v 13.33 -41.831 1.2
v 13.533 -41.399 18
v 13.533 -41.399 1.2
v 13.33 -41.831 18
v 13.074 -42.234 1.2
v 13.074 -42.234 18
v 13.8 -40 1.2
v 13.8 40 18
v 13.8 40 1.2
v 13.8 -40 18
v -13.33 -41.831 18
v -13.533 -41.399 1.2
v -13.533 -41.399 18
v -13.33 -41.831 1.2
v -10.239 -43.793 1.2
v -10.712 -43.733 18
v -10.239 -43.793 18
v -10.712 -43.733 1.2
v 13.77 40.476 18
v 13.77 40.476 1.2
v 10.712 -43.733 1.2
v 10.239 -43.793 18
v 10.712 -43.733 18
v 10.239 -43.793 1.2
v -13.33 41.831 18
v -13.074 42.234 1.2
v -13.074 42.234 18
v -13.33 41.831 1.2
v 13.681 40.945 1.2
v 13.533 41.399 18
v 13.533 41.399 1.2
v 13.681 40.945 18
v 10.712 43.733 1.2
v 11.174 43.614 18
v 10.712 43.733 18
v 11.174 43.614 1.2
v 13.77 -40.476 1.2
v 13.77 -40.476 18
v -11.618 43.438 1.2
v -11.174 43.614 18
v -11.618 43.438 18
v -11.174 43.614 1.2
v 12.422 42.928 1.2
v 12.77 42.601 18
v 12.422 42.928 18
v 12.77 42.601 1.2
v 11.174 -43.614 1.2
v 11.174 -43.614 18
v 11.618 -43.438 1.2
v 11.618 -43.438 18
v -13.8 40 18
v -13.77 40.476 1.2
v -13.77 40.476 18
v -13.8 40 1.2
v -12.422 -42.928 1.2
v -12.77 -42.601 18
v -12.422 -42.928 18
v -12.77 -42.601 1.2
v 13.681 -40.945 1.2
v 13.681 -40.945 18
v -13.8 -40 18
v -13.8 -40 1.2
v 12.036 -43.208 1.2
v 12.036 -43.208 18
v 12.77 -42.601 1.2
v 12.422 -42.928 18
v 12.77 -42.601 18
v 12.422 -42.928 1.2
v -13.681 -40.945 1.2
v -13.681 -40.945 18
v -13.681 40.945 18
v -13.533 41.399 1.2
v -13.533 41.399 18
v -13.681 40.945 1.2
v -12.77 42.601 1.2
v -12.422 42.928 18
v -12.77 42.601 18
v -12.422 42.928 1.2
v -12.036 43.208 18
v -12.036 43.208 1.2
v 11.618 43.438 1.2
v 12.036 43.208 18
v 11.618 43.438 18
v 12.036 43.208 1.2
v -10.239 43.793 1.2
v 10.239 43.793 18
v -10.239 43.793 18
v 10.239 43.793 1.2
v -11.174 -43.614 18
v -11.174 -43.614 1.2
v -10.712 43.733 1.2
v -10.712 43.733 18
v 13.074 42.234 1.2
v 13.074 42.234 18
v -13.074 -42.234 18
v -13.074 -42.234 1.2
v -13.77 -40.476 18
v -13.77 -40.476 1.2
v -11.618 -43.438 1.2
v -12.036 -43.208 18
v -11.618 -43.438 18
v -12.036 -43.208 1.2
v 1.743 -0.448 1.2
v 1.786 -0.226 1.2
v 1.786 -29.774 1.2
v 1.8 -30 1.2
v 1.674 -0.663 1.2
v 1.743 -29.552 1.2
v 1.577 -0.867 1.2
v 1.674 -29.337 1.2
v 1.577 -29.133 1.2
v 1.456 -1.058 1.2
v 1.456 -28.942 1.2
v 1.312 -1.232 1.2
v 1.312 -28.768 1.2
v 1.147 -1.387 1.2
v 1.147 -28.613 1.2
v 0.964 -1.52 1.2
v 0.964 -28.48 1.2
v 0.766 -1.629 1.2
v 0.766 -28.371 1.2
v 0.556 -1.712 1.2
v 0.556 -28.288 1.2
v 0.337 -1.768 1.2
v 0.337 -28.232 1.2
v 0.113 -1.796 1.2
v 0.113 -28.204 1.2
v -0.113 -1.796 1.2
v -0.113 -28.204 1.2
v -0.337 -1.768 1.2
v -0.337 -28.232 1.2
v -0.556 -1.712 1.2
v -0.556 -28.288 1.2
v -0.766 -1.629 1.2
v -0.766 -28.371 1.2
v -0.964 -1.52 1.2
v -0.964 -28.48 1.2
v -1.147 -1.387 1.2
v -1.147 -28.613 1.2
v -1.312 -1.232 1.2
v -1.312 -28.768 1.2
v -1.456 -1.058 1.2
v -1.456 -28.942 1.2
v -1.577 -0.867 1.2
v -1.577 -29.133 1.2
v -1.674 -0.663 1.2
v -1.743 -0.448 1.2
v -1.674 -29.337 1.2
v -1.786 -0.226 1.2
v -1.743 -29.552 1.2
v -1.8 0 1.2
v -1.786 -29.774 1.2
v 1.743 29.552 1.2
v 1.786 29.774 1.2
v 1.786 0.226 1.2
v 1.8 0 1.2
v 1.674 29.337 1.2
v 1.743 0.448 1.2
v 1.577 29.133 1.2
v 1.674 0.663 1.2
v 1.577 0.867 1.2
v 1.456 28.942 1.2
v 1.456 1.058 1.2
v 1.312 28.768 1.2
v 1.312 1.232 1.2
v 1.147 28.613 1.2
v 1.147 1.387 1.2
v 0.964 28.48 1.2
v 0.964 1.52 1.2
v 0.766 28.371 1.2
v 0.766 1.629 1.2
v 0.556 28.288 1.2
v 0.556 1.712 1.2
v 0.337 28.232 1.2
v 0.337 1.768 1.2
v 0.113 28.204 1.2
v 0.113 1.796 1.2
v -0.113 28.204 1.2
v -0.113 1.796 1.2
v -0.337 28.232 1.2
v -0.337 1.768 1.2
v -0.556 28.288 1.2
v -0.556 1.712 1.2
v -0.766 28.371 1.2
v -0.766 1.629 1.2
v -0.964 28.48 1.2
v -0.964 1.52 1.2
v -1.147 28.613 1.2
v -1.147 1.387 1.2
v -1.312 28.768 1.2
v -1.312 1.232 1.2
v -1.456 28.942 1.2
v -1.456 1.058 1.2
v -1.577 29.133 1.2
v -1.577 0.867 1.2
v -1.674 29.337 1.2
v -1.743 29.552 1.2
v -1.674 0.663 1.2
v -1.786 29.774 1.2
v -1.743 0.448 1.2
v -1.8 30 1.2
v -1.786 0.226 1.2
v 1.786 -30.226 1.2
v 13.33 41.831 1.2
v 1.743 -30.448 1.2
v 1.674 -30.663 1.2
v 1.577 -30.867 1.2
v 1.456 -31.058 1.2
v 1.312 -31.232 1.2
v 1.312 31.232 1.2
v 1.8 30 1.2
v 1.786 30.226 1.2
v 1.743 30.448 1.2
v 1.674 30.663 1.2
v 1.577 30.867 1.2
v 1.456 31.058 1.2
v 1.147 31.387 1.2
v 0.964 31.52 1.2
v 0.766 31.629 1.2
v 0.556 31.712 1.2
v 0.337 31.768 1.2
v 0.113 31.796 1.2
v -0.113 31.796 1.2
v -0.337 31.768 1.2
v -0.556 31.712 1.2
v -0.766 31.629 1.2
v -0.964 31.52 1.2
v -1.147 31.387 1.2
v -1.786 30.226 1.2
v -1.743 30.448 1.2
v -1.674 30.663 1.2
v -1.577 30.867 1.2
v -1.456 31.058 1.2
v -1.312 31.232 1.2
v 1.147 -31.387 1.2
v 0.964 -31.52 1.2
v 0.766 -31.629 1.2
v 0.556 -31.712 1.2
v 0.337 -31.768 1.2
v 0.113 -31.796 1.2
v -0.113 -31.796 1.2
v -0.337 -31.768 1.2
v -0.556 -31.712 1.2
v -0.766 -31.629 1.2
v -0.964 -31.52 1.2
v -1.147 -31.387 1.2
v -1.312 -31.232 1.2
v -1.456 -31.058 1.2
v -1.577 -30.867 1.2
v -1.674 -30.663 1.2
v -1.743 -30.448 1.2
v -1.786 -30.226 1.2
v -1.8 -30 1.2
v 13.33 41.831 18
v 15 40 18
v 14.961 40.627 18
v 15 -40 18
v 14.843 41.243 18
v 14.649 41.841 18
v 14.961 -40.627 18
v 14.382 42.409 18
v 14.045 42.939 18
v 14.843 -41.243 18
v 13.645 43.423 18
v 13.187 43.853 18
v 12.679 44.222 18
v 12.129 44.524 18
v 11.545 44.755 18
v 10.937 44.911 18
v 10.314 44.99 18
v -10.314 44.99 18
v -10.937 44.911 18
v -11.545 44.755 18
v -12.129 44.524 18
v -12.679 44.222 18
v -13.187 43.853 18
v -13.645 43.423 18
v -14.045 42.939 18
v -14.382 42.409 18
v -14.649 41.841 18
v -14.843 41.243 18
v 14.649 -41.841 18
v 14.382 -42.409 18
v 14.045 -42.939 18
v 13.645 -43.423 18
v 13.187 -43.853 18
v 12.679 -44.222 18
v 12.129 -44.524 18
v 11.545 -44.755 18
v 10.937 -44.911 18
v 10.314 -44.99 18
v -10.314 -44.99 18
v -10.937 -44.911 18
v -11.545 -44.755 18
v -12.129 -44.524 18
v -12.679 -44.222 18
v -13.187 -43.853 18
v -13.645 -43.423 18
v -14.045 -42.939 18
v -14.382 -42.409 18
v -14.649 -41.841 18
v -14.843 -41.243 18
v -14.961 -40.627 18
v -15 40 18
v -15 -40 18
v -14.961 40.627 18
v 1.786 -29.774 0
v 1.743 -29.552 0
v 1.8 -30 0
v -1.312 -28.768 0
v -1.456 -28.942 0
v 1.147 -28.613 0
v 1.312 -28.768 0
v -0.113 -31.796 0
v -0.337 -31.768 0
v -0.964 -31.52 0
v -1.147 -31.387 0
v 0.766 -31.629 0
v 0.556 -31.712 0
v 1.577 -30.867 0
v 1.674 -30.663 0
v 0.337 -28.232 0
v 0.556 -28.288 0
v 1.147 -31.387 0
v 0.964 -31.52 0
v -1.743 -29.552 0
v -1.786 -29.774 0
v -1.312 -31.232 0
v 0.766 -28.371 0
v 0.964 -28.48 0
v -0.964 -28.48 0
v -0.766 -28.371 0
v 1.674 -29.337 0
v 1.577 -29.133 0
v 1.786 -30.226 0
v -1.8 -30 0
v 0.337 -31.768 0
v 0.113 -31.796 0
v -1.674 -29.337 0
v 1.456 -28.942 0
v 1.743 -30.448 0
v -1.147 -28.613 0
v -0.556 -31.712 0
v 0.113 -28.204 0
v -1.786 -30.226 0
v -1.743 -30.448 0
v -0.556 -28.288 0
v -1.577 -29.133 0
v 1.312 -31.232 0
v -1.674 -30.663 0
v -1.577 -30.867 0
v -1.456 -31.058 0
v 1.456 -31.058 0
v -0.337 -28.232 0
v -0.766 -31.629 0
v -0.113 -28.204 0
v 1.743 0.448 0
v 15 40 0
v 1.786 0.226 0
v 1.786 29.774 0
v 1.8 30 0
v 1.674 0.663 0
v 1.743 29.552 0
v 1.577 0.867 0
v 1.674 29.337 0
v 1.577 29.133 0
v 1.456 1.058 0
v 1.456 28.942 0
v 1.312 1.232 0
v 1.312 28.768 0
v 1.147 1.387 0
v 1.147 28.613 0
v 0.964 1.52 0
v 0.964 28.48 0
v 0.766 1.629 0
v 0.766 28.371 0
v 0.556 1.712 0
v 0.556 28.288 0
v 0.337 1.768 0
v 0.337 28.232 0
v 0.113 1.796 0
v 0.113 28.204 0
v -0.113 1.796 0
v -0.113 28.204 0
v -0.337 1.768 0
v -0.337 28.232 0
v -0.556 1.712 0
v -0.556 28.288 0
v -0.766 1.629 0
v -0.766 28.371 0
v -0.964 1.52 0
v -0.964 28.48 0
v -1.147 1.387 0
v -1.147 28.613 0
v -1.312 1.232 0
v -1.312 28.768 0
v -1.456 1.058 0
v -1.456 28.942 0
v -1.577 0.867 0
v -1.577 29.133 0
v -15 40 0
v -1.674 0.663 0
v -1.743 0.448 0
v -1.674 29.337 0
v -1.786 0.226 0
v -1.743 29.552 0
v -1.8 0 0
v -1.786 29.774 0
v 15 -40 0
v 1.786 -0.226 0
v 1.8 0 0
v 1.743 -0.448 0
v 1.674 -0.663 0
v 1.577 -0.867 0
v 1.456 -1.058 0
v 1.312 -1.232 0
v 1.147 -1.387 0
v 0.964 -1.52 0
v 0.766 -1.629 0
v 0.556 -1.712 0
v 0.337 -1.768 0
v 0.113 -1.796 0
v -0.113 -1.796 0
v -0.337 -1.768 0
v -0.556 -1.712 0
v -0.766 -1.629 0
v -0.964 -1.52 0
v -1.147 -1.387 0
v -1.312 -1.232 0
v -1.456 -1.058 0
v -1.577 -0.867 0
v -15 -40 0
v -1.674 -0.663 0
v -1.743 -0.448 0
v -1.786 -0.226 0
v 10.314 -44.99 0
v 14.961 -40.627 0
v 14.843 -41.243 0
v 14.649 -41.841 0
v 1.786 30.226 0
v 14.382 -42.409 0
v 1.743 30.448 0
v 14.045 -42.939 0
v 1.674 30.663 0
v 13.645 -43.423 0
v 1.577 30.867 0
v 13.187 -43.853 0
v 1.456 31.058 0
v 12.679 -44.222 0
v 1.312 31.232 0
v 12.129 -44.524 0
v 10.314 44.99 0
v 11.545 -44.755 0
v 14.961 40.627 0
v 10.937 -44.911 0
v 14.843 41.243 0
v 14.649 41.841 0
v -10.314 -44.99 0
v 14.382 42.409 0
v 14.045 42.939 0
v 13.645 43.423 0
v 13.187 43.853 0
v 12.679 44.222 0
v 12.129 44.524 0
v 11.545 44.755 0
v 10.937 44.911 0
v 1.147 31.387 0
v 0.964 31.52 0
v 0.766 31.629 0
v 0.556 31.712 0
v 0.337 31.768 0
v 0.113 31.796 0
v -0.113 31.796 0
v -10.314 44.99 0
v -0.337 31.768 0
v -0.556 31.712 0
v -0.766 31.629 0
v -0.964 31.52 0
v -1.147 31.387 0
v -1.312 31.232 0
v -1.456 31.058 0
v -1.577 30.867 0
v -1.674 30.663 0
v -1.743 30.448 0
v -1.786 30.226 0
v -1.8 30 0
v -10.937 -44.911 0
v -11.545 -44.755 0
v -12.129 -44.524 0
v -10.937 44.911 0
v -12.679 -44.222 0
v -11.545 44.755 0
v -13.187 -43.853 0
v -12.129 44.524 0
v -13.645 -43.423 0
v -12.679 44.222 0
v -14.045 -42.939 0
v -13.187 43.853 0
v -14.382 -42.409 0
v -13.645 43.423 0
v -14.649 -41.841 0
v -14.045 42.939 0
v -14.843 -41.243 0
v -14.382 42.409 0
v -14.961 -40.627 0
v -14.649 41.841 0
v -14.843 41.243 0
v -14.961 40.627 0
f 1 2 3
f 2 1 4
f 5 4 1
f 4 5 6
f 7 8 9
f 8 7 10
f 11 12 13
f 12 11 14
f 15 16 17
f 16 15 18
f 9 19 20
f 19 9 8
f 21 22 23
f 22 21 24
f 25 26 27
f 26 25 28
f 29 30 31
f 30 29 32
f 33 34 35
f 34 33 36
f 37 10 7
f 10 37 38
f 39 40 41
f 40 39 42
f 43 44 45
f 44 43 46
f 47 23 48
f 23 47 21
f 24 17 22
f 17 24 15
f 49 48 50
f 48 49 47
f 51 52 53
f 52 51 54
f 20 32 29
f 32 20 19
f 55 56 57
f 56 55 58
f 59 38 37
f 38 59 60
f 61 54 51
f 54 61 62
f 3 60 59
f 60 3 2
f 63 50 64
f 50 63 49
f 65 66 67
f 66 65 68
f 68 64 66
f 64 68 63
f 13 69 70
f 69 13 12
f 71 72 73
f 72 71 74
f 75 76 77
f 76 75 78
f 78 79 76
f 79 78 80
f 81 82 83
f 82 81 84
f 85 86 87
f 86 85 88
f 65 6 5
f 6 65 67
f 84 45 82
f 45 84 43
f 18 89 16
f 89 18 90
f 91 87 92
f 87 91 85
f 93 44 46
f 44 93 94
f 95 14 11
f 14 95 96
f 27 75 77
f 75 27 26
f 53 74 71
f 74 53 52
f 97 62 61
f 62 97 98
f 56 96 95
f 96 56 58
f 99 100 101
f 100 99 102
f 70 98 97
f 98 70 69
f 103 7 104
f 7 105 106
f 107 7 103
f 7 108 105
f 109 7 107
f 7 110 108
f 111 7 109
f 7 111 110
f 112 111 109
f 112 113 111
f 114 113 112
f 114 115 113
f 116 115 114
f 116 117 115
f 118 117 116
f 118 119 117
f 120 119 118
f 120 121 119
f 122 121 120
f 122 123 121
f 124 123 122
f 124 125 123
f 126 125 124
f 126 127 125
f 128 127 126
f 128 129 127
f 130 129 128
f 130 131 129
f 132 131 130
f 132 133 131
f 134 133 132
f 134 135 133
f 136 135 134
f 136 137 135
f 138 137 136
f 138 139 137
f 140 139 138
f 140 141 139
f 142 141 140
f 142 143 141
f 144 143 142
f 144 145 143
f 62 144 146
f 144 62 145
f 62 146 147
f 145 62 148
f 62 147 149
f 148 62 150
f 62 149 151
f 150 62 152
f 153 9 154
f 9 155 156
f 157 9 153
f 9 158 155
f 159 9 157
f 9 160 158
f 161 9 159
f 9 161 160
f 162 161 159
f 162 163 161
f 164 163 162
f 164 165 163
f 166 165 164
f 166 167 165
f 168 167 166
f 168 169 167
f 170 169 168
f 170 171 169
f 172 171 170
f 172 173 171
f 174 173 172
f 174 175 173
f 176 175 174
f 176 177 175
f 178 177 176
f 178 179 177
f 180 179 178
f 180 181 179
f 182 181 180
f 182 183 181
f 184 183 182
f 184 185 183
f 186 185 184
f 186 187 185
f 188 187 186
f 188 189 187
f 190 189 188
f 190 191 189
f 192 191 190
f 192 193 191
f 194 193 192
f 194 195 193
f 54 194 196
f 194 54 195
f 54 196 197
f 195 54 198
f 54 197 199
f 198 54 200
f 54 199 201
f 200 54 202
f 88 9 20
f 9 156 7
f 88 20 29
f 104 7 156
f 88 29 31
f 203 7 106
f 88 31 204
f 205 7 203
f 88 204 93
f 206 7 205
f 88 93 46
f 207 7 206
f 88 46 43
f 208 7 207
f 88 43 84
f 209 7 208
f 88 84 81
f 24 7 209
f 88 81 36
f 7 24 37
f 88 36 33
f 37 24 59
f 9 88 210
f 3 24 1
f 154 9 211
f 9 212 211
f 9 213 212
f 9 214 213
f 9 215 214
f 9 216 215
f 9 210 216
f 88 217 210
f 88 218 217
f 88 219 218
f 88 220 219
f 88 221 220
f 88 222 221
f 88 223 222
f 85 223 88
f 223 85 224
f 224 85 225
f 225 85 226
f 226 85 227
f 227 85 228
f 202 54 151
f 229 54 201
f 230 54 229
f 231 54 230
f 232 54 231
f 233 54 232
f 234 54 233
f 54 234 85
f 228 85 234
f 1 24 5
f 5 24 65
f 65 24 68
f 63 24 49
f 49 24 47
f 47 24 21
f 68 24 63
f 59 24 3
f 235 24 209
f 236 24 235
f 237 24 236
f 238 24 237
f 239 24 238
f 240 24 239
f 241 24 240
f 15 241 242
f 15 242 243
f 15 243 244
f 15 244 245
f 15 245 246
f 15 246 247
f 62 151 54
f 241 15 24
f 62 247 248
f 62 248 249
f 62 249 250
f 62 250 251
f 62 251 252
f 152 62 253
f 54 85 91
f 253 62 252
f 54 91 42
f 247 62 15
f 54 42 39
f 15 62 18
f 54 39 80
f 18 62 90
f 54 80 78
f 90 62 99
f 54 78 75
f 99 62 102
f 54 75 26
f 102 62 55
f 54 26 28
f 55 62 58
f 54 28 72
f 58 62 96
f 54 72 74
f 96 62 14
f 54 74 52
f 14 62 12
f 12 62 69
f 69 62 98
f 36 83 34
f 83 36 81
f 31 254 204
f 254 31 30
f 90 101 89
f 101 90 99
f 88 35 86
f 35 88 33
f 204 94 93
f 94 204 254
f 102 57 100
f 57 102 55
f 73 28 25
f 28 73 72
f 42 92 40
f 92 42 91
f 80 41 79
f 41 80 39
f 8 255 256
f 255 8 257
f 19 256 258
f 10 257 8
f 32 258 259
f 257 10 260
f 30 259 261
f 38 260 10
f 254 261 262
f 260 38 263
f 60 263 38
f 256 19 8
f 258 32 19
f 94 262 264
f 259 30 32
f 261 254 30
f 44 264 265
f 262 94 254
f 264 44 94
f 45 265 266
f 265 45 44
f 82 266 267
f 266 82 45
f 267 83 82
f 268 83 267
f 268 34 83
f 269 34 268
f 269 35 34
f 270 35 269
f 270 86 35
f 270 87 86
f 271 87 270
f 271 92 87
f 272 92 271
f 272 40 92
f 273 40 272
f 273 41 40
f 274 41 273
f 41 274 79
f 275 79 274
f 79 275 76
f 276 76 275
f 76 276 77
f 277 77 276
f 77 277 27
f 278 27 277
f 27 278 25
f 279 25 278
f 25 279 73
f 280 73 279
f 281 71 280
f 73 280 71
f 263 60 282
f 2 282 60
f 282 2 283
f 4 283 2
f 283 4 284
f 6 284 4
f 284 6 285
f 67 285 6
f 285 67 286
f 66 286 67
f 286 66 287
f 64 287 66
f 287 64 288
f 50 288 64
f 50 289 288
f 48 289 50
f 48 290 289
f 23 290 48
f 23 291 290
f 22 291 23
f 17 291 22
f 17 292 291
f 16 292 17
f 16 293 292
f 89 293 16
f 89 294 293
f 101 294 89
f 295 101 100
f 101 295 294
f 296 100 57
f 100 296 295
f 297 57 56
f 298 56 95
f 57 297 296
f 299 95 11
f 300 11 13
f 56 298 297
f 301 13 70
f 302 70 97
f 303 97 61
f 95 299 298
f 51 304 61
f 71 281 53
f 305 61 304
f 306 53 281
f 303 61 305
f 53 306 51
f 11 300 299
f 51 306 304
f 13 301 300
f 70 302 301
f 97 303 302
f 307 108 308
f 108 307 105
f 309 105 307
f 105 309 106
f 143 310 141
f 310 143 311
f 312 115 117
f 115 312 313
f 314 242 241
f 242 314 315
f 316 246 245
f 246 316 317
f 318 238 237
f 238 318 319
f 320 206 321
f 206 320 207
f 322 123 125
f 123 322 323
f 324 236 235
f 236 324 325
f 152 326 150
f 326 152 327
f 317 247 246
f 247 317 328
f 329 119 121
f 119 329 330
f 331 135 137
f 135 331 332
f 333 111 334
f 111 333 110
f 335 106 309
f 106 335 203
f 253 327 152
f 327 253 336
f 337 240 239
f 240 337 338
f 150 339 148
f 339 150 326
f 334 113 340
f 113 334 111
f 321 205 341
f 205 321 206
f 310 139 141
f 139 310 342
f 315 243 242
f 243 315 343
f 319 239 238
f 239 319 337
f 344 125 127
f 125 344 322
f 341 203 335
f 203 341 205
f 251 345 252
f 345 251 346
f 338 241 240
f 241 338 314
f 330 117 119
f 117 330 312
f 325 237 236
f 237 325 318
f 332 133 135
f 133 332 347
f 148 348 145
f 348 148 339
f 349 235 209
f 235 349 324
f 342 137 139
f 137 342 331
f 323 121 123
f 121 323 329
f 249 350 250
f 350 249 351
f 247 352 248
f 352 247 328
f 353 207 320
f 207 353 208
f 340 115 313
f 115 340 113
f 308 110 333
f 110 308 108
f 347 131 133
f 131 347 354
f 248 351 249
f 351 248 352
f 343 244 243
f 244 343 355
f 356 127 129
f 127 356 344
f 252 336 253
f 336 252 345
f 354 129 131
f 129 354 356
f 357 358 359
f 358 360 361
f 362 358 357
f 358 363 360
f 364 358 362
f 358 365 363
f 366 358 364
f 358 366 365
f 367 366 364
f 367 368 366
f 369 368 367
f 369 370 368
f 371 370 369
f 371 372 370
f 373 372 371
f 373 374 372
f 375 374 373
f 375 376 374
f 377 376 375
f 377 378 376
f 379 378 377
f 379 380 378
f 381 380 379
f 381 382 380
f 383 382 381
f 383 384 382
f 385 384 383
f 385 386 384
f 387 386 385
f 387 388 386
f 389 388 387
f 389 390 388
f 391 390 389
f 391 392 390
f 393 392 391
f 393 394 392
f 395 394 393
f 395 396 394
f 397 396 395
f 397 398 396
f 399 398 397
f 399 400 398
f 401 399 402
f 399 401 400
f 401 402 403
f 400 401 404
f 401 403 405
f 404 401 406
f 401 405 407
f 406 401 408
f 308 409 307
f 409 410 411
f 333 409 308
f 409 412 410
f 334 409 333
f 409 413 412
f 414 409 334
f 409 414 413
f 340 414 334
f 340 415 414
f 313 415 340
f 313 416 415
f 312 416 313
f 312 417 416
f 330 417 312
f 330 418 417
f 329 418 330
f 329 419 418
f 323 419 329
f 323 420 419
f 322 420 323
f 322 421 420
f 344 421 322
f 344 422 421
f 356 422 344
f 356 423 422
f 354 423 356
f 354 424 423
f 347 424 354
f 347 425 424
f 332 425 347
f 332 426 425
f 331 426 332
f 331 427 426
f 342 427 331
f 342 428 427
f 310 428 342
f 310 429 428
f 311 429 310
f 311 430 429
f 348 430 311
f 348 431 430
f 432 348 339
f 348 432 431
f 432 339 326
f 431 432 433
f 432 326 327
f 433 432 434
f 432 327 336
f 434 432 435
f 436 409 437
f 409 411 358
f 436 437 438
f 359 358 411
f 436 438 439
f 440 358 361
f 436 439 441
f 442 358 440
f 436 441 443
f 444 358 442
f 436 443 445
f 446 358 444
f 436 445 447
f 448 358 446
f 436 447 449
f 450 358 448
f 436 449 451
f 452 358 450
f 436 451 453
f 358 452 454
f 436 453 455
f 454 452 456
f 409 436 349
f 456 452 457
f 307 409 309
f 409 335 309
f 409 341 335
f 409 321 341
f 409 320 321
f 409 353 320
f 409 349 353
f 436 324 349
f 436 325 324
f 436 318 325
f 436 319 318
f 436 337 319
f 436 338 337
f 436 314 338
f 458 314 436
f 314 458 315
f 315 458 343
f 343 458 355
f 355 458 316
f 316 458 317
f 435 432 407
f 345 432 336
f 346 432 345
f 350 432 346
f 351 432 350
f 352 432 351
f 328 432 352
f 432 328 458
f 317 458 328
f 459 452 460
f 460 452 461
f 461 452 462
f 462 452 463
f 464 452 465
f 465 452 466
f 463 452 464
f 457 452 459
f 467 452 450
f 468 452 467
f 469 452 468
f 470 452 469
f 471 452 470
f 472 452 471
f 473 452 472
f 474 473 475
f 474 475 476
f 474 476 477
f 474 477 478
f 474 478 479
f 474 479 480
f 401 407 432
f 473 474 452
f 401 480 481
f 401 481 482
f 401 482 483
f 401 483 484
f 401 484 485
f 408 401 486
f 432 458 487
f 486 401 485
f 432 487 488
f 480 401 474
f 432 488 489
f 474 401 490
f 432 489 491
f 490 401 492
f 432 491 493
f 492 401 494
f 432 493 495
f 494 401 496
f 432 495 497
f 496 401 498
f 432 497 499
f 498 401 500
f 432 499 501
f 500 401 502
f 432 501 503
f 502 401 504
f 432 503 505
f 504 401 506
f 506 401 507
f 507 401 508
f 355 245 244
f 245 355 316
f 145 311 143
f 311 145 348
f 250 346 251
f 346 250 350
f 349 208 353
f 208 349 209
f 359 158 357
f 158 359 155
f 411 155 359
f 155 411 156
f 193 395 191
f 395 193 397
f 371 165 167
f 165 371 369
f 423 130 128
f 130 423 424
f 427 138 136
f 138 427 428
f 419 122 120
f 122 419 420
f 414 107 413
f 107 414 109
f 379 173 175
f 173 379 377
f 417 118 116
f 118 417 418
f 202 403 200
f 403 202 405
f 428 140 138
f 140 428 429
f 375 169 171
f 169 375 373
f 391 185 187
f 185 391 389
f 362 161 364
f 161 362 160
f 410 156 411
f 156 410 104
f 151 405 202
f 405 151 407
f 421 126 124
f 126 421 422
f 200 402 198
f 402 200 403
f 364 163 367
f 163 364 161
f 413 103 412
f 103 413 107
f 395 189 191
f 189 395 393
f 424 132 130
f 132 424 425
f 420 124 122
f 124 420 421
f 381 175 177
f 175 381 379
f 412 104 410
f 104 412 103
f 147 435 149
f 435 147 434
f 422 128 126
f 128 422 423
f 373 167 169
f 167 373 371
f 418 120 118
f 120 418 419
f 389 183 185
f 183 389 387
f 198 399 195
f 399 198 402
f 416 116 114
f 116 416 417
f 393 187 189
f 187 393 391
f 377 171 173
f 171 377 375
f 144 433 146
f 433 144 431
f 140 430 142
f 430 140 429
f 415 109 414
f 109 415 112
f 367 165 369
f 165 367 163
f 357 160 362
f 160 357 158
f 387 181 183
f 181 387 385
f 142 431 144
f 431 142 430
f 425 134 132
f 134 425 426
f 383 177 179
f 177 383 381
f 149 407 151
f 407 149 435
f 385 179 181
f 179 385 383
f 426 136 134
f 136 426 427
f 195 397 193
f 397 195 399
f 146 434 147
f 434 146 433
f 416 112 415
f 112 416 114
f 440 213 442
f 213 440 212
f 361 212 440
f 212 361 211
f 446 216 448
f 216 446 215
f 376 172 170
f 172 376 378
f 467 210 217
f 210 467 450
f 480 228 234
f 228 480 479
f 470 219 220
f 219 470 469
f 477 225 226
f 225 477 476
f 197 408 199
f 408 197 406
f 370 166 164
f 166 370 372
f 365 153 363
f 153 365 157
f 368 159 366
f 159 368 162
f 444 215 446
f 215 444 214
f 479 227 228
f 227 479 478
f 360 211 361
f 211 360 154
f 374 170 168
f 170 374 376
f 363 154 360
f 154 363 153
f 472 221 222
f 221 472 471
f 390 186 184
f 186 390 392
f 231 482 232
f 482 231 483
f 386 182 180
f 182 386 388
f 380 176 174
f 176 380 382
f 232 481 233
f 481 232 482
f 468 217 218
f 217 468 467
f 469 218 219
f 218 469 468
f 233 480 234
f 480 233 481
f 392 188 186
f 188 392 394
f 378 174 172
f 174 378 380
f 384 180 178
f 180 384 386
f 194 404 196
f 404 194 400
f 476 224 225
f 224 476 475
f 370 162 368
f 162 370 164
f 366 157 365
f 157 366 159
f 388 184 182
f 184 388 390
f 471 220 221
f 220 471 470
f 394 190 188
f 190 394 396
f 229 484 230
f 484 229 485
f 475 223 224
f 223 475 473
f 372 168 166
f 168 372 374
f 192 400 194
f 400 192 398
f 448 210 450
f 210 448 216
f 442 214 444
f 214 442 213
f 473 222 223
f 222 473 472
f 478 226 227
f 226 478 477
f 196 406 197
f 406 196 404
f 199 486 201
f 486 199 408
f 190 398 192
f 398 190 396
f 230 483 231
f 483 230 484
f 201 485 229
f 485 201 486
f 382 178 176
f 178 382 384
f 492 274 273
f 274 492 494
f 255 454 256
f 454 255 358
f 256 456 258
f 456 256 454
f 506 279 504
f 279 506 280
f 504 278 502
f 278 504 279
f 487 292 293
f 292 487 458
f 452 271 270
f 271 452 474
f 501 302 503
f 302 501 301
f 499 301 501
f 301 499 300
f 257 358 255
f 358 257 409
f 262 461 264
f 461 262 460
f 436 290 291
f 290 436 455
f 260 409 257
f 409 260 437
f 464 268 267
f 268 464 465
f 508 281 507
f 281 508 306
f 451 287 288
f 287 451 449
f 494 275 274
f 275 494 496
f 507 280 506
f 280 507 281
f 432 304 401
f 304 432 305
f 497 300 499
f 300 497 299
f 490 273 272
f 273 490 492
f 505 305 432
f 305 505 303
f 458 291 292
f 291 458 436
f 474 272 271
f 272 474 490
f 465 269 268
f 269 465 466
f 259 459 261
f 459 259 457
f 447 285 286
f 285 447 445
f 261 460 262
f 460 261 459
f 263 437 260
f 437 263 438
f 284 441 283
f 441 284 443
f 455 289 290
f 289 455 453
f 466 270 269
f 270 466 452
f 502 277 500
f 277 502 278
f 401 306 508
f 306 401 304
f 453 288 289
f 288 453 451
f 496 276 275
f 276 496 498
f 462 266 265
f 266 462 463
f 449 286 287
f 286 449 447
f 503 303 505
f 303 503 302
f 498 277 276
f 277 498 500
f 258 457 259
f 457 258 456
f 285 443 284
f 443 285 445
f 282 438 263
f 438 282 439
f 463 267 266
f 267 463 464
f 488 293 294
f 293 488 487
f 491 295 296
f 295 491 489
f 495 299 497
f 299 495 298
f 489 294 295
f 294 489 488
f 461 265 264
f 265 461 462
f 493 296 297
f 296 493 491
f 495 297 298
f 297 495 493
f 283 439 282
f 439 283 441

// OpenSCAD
$fn = 50;


difference() {
	union() {
		hull() {
			translate(v = [-10.0000000000, 40.0000000000, 0]) {
				cylinder(h = 18, r = 5);
			}
			translate(v = [10.0000000000, 40.0000000000, 0]) {
				cylinder(h = 18, r = 5);
			}
			translate(v = [-10.0000000000, -40.0000000000, 0]) {
				cylinder(h = 18, r = 5);
			}
			translate(v = [10.0000000000, -40.0000000000, 0]) {
				cylinder(h = 18, r = 5);
			}
		}
	}
	union() {
		translate(v = [0, 0, 1.2000000000]) {
			hull() {
				translate(v = [-10.0000000000, 40.0000000000, 0]) {
					cylinder(h = 16.8000000000, r = 3.8000000000);
				}
				translate(v = [10.0000000000, 40.0000000000, 0]) {
					cylinder(h = 16.8000000000, r = 3.8000000000);
				}
				translate(v = [-10.0000000000, -40.0000000000, 0]) {
					cylinder(h = 16.8000000000, r = 3.8000000000);
				}
				translate(v = [10.0000000000, -40.0000000000, 0]) {
					cylinder(h = 16.8000000000, r = 3.8000000000);
				}
			}
		}
		#translate(v = [0.0000000000, -30.0000000000, 0]) {
			cylinder(h = 1.2000000000, r = 1.8000000000);
		}
		#cylinder(h = 1.2000000000, r = 1.8000000000);
		#translate(v = [0.0000000000, 30.0000000000, 0]) {
			cylinder(h = 1.2000000000, r = 1.8000000000);
		}
	}
}
